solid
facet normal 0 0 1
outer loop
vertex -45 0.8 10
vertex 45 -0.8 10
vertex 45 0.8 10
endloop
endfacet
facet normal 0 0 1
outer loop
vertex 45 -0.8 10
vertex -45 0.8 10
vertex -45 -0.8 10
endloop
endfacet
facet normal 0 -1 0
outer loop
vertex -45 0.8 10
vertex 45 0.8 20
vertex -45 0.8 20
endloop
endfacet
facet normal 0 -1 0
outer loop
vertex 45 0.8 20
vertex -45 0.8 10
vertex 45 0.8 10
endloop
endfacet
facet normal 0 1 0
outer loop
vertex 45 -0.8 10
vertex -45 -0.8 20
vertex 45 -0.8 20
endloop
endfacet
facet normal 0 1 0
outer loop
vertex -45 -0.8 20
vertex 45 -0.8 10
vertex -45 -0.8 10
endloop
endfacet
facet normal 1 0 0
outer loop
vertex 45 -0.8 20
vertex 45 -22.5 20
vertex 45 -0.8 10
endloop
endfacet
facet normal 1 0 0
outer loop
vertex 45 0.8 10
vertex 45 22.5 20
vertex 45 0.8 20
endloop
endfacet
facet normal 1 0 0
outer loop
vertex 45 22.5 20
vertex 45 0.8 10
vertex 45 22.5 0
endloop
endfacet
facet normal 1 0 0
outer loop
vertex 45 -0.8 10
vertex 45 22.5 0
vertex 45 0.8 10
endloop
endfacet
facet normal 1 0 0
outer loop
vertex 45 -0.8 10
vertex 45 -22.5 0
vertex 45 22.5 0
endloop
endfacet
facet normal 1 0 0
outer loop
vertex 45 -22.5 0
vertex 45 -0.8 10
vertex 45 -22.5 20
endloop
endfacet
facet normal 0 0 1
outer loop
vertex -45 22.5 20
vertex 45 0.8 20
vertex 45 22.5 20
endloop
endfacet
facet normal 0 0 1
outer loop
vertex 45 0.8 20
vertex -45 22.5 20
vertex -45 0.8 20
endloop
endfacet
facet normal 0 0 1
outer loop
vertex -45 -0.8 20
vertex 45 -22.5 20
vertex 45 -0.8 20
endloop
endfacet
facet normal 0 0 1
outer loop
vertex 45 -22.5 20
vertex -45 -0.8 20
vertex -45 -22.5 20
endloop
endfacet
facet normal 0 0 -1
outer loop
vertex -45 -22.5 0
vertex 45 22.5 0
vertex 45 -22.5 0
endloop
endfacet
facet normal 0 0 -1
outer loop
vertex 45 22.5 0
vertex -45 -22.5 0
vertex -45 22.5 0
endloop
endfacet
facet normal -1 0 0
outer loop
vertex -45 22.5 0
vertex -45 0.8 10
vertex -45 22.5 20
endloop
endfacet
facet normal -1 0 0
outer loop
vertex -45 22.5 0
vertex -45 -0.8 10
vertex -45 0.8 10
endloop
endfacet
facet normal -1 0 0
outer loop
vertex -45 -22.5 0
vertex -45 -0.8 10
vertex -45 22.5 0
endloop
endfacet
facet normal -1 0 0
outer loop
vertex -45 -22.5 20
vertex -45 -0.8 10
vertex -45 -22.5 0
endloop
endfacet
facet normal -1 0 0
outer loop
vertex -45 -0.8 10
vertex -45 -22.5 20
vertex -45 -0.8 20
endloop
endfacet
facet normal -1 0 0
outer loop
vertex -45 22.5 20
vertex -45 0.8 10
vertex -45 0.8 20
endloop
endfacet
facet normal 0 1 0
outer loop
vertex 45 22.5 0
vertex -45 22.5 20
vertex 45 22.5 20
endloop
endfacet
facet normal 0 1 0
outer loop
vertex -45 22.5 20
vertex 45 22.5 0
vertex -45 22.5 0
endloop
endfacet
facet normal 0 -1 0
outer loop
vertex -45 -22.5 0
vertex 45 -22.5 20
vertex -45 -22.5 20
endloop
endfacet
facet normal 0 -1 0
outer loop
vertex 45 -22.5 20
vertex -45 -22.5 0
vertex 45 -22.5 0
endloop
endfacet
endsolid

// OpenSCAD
// Slide drying rack - holds 10 microscope slides standing upright on their long edge
// Print orientation: base block on the bed (z = 0), slots open at the top

// ---------- Parameters ----------
block_len    = 90;    // block length along X (mm)
block_wid    = 45;    // block width along Y (mm)
block_h      = 20;    // block height along Z (mm)

slot_count   = 10;    // number of slide slots
slot_len     = 77;    // slot length along X (mm)
slot_w       = 1.6;   // slot width along Y (mm)
slot_depth   = 10;    // slot depth into block from top face (mm)
slot_pitch   = 3.5;   // centre-to-centre slot spacing along Y (mm)

eps          = 0.5;   // overshoot of cutters past the top face (mm)

$fn = 64;

// ---------- Model ----------
difference() {
    // Base block, centred in X and Y, resting on z = 0
    translate([-block_len/2, -block_wid/2, 0])
        cube([block_len, block_wid, block_h]);

    // Parallel slots running along X, centred as a group in X and Y
    for (i = [0 : slot_count - 1]) {
        x = (i - (slot_count - 1)/2) * slot_pitch;
        translate([x - slot_len/2, -slot_w/2, block_h - slot_depth])
            cube([slot_len, slot_w, slot_depth + eps]);
    }
}
